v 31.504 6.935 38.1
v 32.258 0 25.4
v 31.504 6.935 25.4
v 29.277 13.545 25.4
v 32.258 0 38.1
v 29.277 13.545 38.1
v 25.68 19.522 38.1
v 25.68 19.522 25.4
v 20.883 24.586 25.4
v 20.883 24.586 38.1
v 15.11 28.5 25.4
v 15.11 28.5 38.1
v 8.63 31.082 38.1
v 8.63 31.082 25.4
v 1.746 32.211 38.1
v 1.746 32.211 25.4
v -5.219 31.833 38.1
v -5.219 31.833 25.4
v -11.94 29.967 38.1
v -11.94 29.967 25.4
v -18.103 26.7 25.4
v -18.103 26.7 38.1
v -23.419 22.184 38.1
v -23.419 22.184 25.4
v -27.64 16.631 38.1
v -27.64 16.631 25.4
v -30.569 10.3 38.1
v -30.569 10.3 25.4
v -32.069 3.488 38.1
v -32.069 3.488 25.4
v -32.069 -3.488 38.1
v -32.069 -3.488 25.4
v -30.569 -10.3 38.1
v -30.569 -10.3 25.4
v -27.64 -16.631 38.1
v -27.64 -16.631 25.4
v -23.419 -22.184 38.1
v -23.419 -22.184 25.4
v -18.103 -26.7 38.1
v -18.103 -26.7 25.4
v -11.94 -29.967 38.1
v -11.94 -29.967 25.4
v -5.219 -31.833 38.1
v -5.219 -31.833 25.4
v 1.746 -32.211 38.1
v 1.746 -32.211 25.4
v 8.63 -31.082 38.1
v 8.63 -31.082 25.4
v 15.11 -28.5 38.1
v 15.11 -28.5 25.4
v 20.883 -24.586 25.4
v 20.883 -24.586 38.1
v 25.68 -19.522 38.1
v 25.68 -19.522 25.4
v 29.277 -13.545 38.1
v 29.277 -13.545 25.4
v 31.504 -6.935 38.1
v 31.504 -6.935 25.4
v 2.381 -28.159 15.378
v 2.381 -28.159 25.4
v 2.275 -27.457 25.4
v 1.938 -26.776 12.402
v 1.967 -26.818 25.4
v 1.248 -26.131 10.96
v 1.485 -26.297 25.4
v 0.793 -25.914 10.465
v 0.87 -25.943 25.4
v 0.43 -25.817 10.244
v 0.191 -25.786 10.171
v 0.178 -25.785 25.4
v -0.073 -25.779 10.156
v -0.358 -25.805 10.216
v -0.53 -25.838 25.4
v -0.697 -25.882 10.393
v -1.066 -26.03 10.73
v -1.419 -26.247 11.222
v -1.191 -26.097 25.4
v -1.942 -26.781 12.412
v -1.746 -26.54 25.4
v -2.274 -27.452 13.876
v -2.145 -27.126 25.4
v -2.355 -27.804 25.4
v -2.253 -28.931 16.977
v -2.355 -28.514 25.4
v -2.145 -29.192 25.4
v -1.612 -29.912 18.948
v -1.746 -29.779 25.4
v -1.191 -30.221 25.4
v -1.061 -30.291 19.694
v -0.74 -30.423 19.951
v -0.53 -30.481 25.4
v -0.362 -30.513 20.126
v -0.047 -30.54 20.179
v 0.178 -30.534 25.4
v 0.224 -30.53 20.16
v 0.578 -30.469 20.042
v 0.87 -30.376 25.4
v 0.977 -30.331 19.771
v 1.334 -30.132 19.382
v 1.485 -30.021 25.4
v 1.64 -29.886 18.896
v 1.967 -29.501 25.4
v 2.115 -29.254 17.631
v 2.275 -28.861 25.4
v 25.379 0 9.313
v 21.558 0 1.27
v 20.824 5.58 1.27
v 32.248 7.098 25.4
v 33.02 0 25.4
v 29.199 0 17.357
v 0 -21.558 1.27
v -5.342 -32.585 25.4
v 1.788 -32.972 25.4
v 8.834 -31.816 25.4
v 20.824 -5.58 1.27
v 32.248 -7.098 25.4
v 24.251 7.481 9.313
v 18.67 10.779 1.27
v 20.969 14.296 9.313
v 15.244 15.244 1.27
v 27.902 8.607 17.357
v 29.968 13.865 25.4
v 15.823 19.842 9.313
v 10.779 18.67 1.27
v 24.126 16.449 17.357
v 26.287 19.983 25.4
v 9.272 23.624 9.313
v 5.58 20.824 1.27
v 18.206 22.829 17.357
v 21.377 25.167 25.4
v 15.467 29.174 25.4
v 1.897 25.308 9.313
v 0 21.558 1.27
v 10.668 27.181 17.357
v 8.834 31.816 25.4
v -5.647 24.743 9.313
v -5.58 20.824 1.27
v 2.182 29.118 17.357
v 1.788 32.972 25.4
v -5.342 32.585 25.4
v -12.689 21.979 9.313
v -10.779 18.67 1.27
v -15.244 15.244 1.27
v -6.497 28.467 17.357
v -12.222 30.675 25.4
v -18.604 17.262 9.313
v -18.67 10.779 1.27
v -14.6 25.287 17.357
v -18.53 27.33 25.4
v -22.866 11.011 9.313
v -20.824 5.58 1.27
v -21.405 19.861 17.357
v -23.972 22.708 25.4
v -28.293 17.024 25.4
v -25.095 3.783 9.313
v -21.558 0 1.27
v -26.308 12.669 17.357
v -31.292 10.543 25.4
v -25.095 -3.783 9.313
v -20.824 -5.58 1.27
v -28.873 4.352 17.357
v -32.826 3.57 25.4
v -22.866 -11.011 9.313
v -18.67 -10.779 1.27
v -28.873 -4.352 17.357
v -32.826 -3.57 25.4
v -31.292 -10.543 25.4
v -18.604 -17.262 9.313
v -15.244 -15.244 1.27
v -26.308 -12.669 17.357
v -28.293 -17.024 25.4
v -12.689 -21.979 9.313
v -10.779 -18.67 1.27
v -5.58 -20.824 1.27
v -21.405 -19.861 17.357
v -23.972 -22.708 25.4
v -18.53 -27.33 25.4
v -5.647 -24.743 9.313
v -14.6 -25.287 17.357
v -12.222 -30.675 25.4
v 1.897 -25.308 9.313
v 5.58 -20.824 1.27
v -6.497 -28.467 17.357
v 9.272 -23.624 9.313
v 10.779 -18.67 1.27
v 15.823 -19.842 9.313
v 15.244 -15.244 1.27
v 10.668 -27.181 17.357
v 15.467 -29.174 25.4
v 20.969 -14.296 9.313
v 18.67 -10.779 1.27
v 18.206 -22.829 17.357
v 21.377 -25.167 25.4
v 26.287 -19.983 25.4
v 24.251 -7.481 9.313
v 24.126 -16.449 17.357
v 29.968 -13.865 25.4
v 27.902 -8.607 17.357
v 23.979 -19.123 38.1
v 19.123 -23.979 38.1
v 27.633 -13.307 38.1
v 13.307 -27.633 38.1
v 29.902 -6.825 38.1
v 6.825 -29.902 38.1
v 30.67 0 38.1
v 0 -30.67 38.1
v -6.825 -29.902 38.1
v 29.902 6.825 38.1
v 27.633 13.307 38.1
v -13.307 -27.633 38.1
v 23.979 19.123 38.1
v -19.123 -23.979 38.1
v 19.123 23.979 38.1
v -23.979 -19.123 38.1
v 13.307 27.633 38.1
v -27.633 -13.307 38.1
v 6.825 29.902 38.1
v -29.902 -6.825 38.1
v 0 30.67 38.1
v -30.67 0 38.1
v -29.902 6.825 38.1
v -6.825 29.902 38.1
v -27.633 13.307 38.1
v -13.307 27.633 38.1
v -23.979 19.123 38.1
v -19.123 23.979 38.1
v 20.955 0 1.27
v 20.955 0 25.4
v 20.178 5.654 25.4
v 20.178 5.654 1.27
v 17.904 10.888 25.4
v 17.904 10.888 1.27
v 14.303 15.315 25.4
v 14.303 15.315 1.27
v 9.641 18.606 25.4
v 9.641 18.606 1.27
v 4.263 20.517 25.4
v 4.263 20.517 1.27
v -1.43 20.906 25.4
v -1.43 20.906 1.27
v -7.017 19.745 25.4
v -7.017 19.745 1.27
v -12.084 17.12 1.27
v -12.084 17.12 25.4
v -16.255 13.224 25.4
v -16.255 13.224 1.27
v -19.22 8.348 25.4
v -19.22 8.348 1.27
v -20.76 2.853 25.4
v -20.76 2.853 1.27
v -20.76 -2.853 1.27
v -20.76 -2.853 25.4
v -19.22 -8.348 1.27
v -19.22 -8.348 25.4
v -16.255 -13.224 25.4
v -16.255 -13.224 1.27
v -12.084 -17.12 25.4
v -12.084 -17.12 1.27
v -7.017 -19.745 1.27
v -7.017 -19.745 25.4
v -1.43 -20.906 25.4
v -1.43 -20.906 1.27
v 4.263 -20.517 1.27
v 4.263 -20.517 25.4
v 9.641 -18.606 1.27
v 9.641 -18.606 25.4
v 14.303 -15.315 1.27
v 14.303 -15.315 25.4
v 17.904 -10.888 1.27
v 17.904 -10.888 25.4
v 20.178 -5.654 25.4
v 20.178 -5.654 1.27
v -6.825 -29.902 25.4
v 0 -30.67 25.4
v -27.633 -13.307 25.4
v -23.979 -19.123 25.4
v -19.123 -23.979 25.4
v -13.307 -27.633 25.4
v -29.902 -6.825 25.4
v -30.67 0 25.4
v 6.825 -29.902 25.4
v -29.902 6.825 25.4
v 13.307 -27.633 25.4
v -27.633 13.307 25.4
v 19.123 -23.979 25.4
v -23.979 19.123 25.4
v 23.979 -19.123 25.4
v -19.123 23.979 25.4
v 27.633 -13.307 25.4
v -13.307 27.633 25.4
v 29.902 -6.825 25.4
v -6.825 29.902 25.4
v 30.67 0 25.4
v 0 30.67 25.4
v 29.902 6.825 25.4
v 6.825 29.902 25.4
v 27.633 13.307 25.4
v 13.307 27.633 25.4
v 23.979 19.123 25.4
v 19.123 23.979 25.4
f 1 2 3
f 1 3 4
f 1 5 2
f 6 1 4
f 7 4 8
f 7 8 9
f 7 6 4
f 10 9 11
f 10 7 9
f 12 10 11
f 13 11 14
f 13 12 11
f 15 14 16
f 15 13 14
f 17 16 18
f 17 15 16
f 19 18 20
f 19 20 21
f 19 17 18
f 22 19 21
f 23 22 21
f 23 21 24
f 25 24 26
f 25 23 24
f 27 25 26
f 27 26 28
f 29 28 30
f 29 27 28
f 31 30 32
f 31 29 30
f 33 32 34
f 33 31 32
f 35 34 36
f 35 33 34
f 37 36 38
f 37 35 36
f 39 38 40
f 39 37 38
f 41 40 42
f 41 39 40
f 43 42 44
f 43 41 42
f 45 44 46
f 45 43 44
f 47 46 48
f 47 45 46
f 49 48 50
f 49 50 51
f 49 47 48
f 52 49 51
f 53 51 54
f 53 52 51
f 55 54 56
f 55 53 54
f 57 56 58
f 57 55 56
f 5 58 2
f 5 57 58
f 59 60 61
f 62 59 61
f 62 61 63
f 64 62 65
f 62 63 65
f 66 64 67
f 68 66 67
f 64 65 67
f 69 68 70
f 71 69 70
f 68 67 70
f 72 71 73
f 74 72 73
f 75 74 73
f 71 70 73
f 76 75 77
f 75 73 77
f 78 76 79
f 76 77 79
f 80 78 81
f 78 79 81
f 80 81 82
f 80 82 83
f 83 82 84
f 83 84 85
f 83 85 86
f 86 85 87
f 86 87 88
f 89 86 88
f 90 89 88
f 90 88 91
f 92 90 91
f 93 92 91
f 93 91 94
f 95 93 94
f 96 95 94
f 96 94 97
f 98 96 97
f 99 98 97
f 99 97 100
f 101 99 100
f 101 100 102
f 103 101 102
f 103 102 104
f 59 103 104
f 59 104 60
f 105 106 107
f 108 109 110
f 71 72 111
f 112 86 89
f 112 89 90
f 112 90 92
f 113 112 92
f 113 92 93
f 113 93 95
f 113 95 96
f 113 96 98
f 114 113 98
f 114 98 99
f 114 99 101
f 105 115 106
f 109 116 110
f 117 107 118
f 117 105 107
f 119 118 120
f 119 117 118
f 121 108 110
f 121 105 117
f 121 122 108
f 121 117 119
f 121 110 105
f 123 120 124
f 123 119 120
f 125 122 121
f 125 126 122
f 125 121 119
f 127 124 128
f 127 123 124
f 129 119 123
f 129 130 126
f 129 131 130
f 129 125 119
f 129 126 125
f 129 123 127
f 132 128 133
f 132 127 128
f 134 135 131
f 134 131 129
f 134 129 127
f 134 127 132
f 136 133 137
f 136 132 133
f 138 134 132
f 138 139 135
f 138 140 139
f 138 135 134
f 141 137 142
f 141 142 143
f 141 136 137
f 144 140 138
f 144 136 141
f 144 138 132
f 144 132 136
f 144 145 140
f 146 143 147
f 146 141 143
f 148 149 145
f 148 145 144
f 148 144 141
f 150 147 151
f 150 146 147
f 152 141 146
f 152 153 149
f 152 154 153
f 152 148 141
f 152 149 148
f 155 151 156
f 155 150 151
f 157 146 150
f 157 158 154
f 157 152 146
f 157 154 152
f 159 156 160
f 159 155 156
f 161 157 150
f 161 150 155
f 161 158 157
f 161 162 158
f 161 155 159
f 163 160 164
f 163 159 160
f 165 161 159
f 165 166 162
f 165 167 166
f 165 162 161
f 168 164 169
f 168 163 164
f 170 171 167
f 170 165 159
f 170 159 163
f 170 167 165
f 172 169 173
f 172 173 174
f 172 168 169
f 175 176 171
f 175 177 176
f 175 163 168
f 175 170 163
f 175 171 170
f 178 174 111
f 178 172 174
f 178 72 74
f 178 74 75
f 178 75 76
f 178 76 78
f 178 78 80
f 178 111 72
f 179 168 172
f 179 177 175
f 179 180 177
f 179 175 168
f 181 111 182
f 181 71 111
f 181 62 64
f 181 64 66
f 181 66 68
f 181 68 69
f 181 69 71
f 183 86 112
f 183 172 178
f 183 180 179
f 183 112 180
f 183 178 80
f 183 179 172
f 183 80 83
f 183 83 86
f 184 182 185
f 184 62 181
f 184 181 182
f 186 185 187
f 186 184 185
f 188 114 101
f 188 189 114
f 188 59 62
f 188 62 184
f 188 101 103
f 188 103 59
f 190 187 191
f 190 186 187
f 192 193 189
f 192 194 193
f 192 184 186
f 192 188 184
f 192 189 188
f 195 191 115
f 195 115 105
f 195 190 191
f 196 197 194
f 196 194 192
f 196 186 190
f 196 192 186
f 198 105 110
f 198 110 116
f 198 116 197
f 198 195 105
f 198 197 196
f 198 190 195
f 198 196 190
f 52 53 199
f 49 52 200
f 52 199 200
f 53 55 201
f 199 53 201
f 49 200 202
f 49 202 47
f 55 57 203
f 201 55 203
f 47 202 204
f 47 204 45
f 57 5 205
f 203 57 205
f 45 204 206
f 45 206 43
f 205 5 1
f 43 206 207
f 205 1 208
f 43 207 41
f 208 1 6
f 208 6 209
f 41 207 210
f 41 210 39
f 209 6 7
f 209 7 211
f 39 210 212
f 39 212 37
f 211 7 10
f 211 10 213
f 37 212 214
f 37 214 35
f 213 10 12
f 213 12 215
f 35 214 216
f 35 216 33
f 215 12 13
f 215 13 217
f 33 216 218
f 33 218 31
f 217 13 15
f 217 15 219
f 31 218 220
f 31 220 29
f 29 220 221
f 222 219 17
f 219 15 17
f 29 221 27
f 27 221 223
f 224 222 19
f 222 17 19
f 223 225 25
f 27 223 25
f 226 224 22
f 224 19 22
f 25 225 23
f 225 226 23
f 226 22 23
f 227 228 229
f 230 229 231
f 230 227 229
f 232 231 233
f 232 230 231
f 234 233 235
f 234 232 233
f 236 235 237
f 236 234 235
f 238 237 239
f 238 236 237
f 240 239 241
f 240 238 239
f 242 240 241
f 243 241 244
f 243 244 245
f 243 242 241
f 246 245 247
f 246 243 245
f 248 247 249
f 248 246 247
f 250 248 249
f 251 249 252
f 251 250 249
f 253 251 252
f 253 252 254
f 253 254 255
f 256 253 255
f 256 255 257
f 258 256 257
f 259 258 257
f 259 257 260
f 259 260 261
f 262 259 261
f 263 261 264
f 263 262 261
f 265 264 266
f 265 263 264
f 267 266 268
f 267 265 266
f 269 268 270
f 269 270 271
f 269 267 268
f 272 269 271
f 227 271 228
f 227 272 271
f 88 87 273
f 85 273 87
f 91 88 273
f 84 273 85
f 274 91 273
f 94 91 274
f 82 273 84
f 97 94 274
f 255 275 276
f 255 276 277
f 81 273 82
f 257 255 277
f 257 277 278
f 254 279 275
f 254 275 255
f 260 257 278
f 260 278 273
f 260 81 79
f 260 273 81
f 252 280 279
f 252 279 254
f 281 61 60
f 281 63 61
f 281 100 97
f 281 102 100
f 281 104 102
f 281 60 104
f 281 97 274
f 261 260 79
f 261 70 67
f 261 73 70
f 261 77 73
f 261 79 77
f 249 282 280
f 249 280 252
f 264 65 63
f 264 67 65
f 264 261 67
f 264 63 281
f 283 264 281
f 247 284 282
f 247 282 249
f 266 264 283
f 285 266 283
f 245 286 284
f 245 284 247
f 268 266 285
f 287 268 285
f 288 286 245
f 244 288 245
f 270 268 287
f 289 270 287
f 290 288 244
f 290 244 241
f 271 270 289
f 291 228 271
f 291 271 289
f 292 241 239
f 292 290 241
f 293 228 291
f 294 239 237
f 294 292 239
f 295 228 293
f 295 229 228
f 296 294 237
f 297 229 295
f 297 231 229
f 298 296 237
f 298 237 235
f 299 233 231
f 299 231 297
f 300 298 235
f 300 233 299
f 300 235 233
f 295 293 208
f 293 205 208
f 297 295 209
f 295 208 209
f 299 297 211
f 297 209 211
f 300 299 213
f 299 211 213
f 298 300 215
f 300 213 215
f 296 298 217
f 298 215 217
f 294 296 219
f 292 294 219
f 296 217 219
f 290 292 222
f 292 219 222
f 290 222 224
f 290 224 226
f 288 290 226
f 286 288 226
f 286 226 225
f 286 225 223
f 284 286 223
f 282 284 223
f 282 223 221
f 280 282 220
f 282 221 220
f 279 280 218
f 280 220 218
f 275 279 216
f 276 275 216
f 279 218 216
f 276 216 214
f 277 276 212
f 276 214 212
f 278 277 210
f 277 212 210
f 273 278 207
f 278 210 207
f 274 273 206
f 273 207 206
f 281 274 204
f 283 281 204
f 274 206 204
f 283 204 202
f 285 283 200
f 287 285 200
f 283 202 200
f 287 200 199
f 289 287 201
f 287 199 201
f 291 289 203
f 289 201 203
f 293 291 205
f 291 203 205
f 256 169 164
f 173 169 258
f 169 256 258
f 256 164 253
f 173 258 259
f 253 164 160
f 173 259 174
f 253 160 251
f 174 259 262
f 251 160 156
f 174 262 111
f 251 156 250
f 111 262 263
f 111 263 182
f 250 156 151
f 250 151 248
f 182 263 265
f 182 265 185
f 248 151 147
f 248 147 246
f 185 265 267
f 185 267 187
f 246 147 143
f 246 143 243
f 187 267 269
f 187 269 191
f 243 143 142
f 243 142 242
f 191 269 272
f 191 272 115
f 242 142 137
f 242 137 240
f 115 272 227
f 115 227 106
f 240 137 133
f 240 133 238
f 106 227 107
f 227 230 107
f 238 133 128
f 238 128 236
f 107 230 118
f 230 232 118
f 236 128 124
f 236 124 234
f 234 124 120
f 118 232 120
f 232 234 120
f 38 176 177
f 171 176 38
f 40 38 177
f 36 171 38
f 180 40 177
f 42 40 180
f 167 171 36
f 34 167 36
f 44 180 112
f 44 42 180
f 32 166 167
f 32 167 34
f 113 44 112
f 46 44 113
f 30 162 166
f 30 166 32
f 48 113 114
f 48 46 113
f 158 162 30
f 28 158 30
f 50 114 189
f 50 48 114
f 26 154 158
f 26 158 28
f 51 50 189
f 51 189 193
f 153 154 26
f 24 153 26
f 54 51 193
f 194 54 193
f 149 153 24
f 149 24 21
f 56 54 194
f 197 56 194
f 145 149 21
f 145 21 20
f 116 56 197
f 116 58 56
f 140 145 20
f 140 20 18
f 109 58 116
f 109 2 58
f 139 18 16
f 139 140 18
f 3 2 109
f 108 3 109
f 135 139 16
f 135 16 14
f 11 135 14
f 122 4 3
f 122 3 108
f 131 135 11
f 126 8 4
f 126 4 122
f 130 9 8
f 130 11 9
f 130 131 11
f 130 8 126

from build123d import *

# Parameters (mm, degrees)
F0_W     = 1.5875
F0_H     = 12.7
F2_R     = 2.38125
F3_DEPTH = 32.9692
F4_R     = 43.342469
F5_DEPTH = 1.27


with BuildPart() as f1:
    # F0 (on Front) → F1 (revolve)
    with BuildSketch(Plane.XZ):
        Polygon((30.6705, 25.4), (20.955, 25.4), (20.955, 0), (33.02, 25.4), (32.258, 25.4), align=None)
        with Locations((31.46425, 31.75)):
            Rectangle(F0_W, F0_H)
    revolve(axis=Axis((0, 0, 24.195854), (0, 0, 1)))

    # F2 (on face) → F3 (cut)
    with BuildSketch(Plane.XY.offset(25.4)):
        with Locations((0, -28.159229)):
            Circle(F2_R)
    extrude(amount=-F3_DEPTH, mode=Mode.SUBTRACT)

    # F4 (on Top) → F5 (cut)
    with BuildSketch(Plane.XY):
        Circle(F4_R)
    extrude(amount=F5_DEPTH, mode=Mode.SUBTRACT)


solid = f1.part
